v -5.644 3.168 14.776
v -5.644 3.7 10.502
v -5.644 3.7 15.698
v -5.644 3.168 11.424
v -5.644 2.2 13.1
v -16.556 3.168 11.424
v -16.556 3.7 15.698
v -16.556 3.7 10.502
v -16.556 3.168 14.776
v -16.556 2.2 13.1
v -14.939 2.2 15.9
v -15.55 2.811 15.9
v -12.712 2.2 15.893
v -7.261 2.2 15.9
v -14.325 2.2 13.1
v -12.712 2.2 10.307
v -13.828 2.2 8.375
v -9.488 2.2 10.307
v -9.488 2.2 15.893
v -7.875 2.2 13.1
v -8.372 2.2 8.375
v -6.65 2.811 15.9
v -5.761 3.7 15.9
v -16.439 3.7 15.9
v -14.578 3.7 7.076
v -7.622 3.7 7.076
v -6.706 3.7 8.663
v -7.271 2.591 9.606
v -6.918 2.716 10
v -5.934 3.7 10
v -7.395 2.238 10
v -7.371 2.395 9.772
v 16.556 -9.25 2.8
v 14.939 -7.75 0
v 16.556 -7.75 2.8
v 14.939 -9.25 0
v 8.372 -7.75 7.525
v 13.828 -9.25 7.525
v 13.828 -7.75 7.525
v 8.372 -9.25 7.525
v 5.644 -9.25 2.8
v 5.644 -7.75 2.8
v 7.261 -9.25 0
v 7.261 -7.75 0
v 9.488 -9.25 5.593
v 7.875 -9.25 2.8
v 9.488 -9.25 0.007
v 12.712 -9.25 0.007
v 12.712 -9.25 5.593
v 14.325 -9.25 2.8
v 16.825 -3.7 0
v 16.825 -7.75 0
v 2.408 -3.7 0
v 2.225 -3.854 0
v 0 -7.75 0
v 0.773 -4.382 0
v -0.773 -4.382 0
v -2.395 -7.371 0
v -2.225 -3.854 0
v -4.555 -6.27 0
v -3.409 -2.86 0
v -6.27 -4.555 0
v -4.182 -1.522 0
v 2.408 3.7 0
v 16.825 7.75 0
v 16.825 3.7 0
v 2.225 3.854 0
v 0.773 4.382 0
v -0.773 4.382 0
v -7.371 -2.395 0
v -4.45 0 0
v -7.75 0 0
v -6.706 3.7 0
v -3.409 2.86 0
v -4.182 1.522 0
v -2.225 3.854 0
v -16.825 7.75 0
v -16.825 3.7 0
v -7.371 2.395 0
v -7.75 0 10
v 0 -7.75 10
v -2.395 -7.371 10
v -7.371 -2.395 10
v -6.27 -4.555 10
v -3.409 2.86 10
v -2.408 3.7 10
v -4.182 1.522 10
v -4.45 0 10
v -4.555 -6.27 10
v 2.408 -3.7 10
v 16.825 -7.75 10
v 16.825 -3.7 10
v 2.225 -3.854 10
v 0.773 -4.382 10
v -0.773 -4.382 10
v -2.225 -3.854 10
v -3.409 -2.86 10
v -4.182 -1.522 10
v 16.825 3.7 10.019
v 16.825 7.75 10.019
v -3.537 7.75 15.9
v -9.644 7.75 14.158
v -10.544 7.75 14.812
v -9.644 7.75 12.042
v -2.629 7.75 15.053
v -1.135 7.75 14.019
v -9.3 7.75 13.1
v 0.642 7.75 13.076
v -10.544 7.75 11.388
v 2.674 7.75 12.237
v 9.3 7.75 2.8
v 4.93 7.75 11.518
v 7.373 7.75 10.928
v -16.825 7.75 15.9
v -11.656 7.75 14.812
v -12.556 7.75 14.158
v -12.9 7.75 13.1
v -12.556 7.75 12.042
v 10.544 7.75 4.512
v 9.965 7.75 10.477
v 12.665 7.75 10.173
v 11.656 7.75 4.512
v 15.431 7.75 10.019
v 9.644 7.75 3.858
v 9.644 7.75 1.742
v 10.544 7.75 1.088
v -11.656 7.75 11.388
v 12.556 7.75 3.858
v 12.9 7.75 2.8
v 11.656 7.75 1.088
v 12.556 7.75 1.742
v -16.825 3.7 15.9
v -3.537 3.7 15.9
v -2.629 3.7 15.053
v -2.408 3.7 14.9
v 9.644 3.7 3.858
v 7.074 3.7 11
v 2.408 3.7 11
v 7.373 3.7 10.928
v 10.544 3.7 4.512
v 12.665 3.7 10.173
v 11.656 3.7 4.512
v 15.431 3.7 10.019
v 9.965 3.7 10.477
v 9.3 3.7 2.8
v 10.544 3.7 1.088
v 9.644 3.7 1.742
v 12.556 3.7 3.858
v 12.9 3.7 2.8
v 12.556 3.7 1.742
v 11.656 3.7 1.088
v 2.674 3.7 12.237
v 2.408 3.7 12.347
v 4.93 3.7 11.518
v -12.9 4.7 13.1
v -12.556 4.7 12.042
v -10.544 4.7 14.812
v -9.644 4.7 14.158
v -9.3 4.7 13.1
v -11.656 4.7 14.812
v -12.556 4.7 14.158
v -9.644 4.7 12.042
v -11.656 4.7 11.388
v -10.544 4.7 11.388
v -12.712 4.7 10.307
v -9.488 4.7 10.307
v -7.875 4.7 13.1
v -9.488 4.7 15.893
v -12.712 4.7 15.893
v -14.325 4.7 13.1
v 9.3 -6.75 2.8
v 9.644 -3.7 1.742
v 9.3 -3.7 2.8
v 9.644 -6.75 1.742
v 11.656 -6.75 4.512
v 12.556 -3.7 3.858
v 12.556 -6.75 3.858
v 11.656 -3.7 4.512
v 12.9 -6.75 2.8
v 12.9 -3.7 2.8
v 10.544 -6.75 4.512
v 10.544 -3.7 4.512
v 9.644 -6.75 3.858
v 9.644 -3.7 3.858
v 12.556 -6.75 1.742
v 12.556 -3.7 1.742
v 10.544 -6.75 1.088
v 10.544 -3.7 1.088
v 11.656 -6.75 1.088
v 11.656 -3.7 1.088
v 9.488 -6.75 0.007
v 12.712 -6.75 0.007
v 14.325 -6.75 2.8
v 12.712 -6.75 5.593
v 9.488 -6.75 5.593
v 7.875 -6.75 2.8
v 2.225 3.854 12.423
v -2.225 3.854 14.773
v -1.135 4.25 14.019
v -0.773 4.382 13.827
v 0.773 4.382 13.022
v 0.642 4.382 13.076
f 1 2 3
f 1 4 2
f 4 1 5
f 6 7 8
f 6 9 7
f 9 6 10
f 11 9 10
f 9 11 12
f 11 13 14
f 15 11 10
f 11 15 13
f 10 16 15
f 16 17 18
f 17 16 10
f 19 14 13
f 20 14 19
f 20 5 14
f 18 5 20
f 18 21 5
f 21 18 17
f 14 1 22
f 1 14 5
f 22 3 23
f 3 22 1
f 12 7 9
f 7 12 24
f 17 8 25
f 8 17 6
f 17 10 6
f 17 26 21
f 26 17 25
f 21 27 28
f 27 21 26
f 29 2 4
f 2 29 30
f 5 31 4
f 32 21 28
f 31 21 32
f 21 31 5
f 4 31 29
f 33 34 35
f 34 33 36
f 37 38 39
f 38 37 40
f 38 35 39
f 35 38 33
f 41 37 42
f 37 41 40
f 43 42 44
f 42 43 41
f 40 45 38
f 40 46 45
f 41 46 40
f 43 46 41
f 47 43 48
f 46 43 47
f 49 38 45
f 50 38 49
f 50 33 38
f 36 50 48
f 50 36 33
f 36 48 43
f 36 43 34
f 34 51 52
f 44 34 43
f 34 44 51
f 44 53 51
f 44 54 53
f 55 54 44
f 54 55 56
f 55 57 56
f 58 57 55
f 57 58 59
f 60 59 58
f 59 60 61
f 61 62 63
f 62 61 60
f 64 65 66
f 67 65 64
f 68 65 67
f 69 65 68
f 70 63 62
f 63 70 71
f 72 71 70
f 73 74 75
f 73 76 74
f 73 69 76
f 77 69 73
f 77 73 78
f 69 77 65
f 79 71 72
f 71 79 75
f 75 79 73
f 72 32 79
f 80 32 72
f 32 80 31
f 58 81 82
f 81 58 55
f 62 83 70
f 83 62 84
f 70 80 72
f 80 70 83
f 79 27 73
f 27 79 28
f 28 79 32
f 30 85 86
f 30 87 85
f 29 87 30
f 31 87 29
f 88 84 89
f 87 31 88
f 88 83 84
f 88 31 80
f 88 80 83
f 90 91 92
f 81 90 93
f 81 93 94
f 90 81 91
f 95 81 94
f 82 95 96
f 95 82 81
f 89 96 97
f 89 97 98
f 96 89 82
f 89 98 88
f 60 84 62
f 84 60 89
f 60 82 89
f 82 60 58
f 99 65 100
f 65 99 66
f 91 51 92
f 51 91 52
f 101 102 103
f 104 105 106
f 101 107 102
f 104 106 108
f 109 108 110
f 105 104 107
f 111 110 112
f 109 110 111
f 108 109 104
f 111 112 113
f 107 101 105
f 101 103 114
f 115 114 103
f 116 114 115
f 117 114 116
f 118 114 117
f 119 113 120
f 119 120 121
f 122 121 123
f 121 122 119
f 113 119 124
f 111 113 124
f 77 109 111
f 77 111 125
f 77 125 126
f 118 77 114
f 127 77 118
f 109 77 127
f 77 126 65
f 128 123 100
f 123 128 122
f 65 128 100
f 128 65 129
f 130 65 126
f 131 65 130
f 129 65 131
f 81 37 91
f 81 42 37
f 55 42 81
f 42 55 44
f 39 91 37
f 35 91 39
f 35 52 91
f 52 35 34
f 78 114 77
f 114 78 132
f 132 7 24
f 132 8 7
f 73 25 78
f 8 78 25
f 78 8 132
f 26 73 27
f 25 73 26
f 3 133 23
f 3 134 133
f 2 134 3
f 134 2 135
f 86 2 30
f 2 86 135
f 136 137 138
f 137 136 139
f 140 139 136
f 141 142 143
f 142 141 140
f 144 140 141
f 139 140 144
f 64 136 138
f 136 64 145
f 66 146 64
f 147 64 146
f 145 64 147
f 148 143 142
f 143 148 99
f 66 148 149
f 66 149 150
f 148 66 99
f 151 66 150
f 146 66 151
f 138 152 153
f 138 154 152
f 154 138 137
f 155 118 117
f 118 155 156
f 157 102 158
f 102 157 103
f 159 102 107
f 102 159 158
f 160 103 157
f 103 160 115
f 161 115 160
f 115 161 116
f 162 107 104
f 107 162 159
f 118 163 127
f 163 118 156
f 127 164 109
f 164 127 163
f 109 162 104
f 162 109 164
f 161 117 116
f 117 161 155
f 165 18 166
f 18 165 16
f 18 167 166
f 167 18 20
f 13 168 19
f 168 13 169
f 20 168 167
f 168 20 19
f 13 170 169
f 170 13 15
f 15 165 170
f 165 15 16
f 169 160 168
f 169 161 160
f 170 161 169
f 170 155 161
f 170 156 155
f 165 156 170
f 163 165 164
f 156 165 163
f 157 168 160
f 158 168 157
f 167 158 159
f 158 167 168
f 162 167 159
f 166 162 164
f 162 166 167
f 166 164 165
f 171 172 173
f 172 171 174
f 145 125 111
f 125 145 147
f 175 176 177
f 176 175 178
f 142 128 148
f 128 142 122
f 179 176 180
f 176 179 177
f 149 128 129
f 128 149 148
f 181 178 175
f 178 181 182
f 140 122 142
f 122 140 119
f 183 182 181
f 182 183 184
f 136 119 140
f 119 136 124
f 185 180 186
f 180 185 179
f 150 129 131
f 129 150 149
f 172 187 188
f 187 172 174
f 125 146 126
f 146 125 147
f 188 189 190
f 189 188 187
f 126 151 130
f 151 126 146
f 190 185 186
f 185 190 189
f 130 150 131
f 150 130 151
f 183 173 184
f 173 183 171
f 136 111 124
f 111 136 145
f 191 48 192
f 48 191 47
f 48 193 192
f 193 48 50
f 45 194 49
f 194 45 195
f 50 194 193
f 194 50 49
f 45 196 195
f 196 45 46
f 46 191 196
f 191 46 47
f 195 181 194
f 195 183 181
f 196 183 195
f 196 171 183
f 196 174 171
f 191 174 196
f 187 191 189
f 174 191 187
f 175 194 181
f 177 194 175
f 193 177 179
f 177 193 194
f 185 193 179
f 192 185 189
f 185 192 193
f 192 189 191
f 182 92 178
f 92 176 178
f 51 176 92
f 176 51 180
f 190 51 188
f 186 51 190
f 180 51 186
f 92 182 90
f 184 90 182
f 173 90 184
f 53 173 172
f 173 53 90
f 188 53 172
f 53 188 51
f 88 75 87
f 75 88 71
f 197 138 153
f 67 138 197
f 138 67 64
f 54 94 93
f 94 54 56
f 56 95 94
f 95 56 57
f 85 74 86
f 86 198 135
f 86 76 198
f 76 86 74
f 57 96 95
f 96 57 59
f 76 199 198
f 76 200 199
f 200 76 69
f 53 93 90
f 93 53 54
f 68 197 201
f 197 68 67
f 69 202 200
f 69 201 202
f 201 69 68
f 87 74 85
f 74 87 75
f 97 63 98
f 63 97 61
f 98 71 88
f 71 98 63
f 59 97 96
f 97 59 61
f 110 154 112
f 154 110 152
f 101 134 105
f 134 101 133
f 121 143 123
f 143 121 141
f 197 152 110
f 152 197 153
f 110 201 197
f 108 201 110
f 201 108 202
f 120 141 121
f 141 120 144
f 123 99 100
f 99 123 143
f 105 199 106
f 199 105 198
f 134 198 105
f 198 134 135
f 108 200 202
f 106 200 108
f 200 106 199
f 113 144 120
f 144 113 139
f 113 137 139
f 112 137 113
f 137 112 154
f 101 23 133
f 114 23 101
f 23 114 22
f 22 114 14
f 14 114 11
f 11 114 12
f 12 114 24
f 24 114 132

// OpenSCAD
// file: metric.scad
// PRUSA Mendel  
// Default metric sizes
// GNU GPL v2
// Josef Průša
// josefprusa@me.com
// prusadjs.cz
// http://www.reprap.org/wiki/Prusa_Mendel
// http://github.com/prusajr/PrusaMendel

// RODS

threaded_rod_diameter = 8.2;
smooth_bar_diameter = 8;

// Nuts and bolts
// For all nuttraps and screw holse 
m8_diameter = 8.9;
m8_nut_diameter = 15.25;

m4_diameter = 4.5;
m4_nut_diameter = 8.1;
m4_nut_heigth = 3.2;

m3_diameter = 3.6;
m3_nut_diameter = 6.45;
m3_nut_heigth = 2.3;
m3_nut_wallDist = _wallDistFromDia(m3_nut_diameter);
m3_nut_diameter_horizontal = 6.1;

// elongetaed nuttraps
// where a nut is put in an slot and inthere hits the perpendicular threadhole
m3_elongNtt_tolerance = [0.5,0,0.5];// additional [diameter,depth,height]  // depth is not implemented

// linear Bearings
lber_length = 24;
lber_diam = 15.3;

// Motors

motor_shaft = 5.5;


/******************************************************************************/ 
/*                                  INTERNAL                                  */
/******************************************************************************/
/*-----------------!!! do not change things below this !!!--------------------*/
m3_elongNtt_diameter = m3_nut_diameter + m3_elongNtt_tolerance[0];
m3_elongNtt_wallDist = _wallDistFromDia(m3_elongNtt_diameter);
m3_elongNtt_height = m3_nut_heigth + m3_elongNtt_tolerance[2];



function _wallDistFromDia(dia) = cos(30)*dia;
// main file
// PRUSA Mendel  
// Endstop holder
// Used to attach endstops to 8mm rods
// GNU GPL v2
// Josef Průša
// josefprusa@me.com
// prusadjs.cz
// http://www.reprap.org/wiki/Prusa_Mendel
// http://github.com/prusajr/PrusaMendel

include <metric.scad>

/**
 * @name Endstop holder
 * @category Printed
 * @using 1 m3x20
 * @using 1 m3nut
 * @using 2 m3washer
 */
module endstop()
{
	outer_radius=m8_diameter/2+3.3;
	opening_size=m8_diameter-1.5;
	endstop_thickness=outer_radius-opening_size/2;
	screw_support_x=2.5;
	screw_support_z=1.5;
	hole_x_spacing=22.2;
	hole_y_spacing=10.3;
	endstop_clamp_height=10;
	endstop_height=15.9;

	full_height=hole_y_spacing+m3_nut_diameter+2*screw_support_z;
	screw_surround=m3_nut_diameter+screw_support_x*2;
	full_length=hole_x_spacing+m3_nut_diameter+screw_support_x*2;
	
	intersection()
	{
	difference()
	{
		union()
		{
			#cylinder(h=10,r=outer_radius,$fn=20);

			translate([0,-outer_radius, 0]) 
			cube([hole_x_spacing/2+m3_nut_diameter/2+screw_support_x,
				outer_radius*2,endstop_clamp_height]);

			translate([-hole_x_spacing/2-m3_nut_diameter/2-screw_support_x,
				outer_radius-endstop_thickness,0])
			cube([full_length,endstop_thickness,full_height]);


			for(i=[-1,1])
			translate([0,0,endstop_height/2])
			rotate([90, 0, 0]) 
			translate([i*hole_x_spacing/2,-1*i*hole_y_spacing/2,0])
			{
				if(i==1)
				translate([0,0,outer_radius-screw_support_z])
				cylinder(h=screw_support_z*2,
					r=(m3_nut_diameter/2+screw_support_z)/cos(30),$fn = 6);

				if(i==-1)
				translate([0,0,-outer_radius+endstop_thickness])
				render()
				intersection()
				{
				translate([0,-screw_support_z,0])
				cube([(m3_nut_diameter/2+screw_support_z)/cos(30)*2,
					m3_nut_diameter+screw_support_z*2+2*screw_support_z,								screw_support_z*2+2],center=true);

				cylinder(h=screw_support_z,
					r2=(m3_nut_diameter/2+screw_support_z)/cos(30),
					r1=(m3_nut_diameter/2+screw_support_z)/cos(30)+screw_support_z,$fn = 6);
				}
			}

		}
	
		translate([0,-opening_size/2,-1]) 
		cube([18,opening_size,endstop_clamp_height+2]);

		translate([0,0,-1]) 
		cylinder(h=hole_y_spacing+m3_nut_diameter+2*screw_support_z+2,r=m8_diameter/2,$fn=18);

		for(i=[-1,1])
		translate([0,0,endstop_height/2])
		rotate([90, 0, 0]) 
		translate([i*hole_x_spacing/2,-1*i*hole_y_spacing/2,0])
		{
			cylinder(h=outer_radius*2+2,r=m3_diameter/2,$fn=10,center=true);
			translate((i==-1)?
				[0,0,-outer_radius+endstop_thickness-1]:
				[0,0,outer_radius-1])
			cylinder(h=4,r= m3_nut_diameter/2,$fn=6);
		}

		translate([full_length/2,0,full_height])
		scale([(full_length-screw_surround)/(full_height-endstop_clamp_height),1,1])
		rotate([90,0,0])
		cylinder(r=full_height-endstop_clamp_height,h=outer_radius*2+2,center=true,$fn=50);
	}
	translate([-full_length/2,-outer_radius-5])
	cube([full_length,outer_radius*2+10,endstop_height]);
	}
}
endstop();
